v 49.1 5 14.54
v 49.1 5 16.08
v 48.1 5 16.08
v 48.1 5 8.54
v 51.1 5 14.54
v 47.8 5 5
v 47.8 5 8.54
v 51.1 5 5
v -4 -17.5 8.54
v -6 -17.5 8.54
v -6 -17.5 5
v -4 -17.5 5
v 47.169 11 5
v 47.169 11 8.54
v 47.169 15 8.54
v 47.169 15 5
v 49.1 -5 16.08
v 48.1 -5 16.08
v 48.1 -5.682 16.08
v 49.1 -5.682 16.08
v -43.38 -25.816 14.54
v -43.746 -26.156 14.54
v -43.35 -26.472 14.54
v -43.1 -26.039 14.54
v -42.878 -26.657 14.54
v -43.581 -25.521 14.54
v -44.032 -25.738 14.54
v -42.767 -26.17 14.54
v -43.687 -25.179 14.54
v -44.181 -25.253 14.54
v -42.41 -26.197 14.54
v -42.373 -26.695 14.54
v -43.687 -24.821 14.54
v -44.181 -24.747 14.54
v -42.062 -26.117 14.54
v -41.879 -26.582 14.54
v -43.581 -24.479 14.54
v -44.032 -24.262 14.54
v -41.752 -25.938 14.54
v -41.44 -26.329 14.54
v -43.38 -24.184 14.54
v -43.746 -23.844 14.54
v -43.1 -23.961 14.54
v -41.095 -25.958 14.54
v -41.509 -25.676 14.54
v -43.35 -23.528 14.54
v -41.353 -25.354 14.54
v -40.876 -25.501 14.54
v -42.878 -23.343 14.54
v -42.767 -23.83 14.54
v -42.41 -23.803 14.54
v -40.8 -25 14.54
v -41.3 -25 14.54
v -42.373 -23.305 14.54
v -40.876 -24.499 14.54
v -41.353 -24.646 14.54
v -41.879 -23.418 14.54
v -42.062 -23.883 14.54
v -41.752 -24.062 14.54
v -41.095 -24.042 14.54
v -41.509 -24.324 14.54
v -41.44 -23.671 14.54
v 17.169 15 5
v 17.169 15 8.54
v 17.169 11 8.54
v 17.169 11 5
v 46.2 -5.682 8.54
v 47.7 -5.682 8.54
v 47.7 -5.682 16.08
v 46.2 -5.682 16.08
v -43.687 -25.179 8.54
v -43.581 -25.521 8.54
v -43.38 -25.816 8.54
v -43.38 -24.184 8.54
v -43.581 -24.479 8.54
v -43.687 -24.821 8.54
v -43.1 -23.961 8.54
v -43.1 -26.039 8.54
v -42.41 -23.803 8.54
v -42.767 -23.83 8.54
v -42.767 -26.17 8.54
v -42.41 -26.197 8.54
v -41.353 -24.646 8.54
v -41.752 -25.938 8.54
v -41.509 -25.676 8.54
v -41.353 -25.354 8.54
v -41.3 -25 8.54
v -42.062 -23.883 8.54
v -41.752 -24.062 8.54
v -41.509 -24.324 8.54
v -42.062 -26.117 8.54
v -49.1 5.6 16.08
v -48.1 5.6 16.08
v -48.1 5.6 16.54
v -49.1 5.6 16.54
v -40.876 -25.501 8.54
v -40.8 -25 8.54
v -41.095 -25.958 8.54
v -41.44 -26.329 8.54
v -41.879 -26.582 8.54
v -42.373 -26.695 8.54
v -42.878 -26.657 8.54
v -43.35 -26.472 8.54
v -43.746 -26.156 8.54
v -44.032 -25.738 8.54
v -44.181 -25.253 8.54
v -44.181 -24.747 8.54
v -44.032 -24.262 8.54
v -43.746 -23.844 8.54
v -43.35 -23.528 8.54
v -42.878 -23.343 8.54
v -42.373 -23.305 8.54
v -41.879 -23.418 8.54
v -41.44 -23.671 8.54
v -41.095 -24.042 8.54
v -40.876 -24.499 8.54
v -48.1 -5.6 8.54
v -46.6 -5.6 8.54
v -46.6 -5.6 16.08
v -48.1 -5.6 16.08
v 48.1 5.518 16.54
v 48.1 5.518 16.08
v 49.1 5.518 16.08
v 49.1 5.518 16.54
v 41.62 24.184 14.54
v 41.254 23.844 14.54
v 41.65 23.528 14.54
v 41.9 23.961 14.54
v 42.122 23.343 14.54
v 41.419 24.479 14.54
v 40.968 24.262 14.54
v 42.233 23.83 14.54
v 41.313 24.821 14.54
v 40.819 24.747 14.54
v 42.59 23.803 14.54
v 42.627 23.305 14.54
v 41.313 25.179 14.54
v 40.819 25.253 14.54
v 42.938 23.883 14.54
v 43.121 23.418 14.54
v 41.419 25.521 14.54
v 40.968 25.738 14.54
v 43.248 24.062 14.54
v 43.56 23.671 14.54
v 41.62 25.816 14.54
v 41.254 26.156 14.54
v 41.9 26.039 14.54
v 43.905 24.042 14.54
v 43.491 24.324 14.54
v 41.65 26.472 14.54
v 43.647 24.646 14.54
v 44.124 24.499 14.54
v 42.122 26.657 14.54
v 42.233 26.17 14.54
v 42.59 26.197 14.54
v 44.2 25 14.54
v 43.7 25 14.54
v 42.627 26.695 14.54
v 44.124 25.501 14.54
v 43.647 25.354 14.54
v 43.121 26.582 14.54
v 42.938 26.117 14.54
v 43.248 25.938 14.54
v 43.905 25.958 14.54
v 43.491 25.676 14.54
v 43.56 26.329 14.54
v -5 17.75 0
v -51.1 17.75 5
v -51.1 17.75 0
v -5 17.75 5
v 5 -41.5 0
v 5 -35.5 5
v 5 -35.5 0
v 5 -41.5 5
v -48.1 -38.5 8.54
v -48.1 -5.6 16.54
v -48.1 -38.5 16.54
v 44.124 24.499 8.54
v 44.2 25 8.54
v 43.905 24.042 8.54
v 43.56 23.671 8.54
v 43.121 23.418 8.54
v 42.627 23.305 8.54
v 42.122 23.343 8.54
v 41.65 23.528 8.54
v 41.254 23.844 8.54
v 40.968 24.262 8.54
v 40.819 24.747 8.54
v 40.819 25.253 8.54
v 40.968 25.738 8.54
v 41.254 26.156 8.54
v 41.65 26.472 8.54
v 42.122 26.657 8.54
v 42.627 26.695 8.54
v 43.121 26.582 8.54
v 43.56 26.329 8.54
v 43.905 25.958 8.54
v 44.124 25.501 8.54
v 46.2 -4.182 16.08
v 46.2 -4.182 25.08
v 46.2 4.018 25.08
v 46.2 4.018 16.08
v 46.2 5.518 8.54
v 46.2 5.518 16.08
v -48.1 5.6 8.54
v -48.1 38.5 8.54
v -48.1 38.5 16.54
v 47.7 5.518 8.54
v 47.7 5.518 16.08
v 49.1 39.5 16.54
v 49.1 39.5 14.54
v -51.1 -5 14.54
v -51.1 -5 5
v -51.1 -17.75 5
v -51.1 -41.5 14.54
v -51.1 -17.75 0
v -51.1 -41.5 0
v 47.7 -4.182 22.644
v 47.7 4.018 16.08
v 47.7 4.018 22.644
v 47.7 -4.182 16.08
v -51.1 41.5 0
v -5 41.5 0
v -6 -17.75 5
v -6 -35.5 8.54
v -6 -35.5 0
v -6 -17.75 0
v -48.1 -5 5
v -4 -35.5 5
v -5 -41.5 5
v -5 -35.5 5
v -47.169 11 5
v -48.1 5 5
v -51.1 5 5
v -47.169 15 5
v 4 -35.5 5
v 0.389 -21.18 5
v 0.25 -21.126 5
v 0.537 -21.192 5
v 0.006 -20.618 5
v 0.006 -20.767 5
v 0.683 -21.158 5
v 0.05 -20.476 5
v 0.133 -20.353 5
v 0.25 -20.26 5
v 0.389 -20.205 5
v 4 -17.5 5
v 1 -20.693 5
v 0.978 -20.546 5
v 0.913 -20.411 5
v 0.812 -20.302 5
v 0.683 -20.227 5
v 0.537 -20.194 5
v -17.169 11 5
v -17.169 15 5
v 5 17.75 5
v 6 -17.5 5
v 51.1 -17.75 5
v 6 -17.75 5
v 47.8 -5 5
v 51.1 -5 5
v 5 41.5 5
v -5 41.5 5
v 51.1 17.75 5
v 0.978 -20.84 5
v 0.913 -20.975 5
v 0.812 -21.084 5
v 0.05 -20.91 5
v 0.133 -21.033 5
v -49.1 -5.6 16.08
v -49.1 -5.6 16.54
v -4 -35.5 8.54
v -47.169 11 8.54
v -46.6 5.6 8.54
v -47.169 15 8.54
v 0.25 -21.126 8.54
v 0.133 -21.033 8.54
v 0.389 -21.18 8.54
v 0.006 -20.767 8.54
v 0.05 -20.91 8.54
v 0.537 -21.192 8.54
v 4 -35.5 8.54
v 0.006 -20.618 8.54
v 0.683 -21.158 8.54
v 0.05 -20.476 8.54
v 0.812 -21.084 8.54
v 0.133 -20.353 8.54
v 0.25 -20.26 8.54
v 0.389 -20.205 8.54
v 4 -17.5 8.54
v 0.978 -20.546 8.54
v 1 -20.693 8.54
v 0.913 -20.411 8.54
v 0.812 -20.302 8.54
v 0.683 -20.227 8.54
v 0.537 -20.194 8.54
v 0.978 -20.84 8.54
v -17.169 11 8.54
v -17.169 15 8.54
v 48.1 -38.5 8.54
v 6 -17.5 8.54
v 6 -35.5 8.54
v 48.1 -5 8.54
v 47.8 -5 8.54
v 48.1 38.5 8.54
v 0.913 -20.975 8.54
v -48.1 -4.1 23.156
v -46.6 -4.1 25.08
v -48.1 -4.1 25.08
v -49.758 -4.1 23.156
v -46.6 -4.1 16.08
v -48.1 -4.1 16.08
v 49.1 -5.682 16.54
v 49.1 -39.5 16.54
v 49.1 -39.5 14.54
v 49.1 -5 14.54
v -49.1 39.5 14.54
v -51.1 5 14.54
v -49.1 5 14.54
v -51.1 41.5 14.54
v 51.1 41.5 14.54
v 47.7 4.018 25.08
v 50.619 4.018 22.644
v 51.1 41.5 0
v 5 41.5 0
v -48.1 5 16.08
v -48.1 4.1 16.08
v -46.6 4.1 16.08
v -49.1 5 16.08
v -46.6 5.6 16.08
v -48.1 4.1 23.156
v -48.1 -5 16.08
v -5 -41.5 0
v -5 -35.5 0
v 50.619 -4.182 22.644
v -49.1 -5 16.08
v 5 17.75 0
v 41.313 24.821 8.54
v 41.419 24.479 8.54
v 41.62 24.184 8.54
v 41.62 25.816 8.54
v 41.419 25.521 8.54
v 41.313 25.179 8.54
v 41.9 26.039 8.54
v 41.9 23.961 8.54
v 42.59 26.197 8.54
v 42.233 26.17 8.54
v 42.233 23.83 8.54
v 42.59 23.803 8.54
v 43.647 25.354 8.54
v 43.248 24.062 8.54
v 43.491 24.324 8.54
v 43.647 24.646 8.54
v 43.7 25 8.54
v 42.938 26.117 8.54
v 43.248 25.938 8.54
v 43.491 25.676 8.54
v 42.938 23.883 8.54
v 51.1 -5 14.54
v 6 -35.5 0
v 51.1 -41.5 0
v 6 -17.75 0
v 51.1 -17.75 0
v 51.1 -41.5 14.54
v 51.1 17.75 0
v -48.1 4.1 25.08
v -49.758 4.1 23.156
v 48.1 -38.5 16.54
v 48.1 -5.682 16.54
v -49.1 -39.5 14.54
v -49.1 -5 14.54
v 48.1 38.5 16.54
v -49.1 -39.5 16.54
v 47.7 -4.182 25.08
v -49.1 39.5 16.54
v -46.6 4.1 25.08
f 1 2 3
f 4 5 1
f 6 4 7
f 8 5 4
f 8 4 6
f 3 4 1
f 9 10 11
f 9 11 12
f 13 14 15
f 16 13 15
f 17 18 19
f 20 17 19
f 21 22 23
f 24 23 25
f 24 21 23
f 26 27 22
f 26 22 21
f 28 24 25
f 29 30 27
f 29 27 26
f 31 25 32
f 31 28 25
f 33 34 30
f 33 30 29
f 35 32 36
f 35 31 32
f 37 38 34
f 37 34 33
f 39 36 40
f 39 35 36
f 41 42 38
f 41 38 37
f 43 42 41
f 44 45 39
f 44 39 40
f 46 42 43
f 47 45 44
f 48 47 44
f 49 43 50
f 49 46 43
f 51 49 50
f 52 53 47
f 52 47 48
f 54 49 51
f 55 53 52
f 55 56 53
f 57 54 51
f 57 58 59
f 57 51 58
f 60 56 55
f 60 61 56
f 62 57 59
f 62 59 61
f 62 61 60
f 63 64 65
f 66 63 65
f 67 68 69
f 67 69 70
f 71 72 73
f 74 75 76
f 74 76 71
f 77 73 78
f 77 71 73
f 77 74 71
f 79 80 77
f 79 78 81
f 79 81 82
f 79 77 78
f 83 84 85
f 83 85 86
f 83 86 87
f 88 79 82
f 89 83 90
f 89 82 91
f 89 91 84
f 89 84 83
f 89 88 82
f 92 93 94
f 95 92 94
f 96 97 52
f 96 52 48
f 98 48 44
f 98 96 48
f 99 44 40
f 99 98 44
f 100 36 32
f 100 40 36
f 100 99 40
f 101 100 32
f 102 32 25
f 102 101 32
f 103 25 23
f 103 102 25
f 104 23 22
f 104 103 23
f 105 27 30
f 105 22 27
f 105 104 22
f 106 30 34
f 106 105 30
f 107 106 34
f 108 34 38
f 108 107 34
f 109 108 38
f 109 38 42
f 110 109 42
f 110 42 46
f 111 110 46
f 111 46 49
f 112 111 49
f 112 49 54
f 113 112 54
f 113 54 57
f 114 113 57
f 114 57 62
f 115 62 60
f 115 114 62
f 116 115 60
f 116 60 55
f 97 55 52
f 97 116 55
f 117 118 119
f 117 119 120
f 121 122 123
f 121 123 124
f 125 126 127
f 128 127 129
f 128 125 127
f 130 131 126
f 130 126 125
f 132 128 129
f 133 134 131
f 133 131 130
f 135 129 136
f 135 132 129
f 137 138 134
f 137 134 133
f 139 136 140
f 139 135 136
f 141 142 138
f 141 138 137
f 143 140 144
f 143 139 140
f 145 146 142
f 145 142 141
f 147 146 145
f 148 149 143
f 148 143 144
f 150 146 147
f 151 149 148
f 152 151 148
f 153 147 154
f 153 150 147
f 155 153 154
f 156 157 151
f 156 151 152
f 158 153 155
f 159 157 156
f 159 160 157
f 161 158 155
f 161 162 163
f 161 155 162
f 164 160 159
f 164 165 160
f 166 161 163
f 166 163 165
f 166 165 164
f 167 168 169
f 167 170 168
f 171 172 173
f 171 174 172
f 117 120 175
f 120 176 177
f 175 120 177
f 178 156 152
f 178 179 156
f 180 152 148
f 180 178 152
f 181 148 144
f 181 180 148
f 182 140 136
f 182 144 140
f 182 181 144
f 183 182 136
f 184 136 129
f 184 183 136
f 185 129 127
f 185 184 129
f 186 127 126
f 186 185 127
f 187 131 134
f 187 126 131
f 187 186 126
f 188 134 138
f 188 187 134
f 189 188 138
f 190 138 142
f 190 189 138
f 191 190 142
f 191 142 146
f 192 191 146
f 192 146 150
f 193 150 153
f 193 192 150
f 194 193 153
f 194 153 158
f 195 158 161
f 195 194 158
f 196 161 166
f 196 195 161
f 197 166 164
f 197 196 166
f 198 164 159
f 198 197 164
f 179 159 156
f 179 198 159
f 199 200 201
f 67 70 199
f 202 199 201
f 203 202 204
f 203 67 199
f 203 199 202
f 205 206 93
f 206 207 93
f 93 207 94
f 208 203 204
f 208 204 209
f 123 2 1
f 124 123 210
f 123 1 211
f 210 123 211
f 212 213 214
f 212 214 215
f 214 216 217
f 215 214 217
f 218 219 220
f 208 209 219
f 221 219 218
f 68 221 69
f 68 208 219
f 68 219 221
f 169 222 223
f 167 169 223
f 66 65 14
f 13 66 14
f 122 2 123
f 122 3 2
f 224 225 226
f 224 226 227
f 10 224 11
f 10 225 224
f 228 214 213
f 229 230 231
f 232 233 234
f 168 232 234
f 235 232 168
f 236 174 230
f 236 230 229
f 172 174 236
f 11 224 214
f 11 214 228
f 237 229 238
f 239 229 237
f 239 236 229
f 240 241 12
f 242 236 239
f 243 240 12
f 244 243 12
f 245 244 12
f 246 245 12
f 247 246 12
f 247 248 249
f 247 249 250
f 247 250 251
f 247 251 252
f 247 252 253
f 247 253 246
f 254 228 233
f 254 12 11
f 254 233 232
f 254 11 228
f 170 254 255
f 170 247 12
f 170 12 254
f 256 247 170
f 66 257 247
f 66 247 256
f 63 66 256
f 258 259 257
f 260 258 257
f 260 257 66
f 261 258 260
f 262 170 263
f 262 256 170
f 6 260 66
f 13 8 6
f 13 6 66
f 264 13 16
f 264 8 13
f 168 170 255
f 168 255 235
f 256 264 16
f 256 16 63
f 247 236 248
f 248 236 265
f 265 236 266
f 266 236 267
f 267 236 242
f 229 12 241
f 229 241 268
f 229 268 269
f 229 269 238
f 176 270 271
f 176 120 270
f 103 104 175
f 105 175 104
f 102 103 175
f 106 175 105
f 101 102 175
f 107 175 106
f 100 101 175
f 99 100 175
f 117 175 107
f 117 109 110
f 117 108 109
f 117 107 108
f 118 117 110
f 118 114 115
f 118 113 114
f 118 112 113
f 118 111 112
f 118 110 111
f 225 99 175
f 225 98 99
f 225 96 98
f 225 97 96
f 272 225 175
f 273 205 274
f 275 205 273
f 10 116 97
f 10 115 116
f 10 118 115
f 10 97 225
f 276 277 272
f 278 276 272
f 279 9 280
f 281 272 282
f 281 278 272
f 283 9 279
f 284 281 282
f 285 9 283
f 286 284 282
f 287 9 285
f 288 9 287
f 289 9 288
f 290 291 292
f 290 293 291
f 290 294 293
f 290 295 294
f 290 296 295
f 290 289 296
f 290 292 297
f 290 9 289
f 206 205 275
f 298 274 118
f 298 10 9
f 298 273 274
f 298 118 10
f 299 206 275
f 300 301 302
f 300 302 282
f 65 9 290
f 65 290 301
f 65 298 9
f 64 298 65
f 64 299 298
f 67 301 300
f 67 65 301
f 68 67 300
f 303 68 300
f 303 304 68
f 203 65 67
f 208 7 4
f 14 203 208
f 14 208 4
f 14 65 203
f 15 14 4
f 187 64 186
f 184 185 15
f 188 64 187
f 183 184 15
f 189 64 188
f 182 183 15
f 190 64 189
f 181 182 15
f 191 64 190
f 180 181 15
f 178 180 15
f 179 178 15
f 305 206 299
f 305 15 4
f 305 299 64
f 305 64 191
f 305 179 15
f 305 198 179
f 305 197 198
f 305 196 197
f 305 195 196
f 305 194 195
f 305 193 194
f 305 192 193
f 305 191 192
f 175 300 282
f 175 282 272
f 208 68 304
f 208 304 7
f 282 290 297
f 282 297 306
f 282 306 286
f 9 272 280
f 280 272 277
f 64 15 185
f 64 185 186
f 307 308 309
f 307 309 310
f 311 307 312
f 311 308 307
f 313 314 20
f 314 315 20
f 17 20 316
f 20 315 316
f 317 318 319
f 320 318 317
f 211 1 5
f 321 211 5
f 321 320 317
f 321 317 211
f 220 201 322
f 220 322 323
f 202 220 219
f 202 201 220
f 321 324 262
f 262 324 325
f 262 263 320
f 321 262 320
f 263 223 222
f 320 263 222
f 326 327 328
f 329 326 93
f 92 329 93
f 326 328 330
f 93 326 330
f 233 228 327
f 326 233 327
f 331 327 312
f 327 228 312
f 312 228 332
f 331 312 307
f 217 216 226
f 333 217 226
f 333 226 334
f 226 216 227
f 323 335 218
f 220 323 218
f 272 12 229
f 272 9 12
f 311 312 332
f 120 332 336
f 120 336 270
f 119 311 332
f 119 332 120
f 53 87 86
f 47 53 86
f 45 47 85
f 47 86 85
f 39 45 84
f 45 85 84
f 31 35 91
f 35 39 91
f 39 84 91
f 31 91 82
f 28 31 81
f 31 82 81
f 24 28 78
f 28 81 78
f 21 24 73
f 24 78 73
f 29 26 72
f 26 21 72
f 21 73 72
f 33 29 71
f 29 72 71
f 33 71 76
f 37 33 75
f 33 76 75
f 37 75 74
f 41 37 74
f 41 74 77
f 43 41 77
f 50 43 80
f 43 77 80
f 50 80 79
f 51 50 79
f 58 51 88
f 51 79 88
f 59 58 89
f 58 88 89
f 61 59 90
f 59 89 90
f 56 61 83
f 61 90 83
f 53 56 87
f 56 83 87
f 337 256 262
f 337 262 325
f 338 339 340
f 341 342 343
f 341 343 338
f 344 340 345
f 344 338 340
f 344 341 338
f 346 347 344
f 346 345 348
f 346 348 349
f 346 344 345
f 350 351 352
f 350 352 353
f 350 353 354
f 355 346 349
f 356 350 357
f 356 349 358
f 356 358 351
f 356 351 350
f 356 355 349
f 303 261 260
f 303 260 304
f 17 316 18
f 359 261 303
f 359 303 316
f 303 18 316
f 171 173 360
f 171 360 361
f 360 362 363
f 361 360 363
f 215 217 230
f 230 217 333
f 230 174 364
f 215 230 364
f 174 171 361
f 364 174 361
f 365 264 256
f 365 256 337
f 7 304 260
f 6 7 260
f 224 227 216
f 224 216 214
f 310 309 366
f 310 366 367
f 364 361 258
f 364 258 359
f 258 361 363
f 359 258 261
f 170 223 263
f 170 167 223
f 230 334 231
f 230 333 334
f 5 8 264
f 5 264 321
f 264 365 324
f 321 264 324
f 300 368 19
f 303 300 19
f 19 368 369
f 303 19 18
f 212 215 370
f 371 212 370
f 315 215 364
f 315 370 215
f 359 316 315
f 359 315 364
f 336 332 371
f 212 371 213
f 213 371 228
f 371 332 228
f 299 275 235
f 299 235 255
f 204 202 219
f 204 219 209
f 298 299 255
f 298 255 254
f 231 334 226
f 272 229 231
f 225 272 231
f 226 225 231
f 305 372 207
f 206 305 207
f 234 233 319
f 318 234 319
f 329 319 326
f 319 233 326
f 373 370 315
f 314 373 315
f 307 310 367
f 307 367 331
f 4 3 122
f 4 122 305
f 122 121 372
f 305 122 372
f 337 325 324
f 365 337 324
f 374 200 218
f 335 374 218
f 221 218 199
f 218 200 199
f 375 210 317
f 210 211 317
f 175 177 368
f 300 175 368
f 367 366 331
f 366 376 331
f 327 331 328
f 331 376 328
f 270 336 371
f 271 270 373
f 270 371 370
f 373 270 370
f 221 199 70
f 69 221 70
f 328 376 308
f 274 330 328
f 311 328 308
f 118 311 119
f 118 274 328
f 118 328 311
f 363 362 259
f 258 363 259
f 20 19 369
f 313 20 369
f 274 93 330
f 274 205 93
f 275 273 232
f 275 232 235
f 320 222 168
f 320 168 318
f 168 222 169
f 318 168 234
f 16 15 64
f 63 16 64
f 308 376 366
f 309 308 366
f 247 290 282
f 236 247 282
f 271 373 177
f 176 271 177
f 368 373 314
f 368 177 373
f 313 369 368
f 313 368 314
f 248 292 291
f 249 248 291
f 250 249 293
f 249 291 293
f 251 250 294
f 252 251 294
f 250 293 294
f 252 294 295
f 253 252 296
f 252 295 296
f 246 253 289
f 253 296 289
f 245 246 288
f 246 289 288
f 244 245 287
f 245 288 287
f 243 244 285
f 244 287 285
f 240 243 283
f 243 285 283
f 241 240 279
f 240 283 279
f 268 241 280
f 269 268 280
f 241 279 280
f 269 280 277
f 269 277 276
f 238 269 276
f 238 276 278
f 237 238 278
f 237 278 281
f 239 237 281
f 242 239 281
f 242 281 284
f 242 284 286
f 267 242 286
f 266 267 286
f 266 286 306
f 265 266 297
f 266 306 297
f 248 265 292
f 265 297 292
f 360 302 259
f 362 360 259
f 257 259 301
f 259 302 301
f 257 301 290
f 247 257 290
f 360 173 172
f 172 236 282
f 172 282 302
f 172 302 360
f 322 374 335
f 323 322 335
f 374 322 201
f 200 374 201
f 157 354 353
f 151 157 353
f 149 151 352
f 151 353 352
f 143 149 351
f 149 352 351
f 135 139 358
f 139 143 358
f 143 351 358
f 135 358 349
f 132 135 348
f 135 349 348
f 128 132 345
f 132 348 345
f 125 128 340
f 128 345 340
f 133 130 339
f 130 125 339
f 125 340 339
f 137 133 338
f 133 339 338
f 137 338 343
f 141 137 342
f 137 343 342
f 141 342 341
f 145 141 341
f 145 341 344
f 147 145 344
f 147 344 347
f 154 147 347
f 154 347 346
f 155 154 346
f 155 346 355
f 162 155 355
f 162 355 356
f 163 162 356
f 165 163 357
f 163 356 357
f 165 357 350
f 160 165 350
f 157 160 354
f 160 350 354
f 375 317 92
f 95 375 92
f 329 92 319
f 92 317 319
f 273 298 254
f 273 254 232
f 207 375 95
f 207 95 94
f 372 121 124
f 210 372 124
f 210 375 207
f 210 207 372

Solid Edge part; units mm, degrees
sketch "Sketch1" plane through (0, 0, 0) normal (0, 0, 1) x (1, 0, 0)
  line L0 (51.1, -41.5) -> (51.1, 41.5)
  line L1 (51.1, 41.5) -> (-51.1, 41.5)
  line L2 (-51.1, 41.5) -> (-51.1, -41.5)
  line L3 (-51.1, -41.5) -> (51.1, -41.5)
extrude "Protrusion1" add sketch "Sketch1" along normal blind 14.54
sketch "Sketch2" plane through (0, 0, 14.54) normal (0, 0, 1) x (1, 0, 0)
  line L0 (49.1, -39.5) -> (49.1, 39.5)
  line L1 (49.1, 39.5) -> (-49.1, 39.5)
  line L2 (-49.1, 39.5) -> (-49.1, -39.5)
  line L3 (-49.1, -39.5) -> (49.1, -39.5)
extrude "ProtrusiónExtruida_2" add sketch "Sketch2" along normal blind 2
sketch "Sketch3" plane through (0, 0, 16.54) normal (0, 0, 1) x (1, 0, 0)
  line L0 (48.1, -38.5) -> (48.1, 38.5)
  line L1 (48.1, 38.5) -> (-48.1, 38.5)
  line L2 (-48.1, 38.5) -> (-48.1, -38.5)
  line L3 (-48.1, -38.5) -> (48.1, -38.5)
extrude "VaciadoExtruido_1" cut sketch "Sketch3" against normal blind 8
sketch "Sketch4" plane through (0, 0, 8.54) normal (0, 0, 1) x (1, 0, 0)
  circle A0 centre (42.5, 25) radius 1.7
  circle A1 centre (42.5, 25) radius 1.2
  circle A2 centre (-42.5, -25) radius 1.7
  circle A3 centre (-42.5, -25) radius 1.2
  dimension "D1" = 2.4
  dimension "D2" = 2.4
  dimension "D3" = 3.4
  dimension "D4" = 3.4
extrude "ProtrusiónExtruida_5" add sketch "Sketch4" along normal blind 6
sketch "Sketch5" plane through (0, 0, 8.54) normal (0, 0, 1) x (1, 0, 0)
  line L0 (-6, -35.5) -> (-6, -17.5)
  line L1 (-6, -17.5) -> (-4, -17.5)
  line L2 (-4, -17.5) -> (-4, -35.5)
  line L3 (-4, -35.5) -> (-6, -35.5)
  line L4 (6, -35.5) -> (6, -17.5)
  line L5 (6, -17.5) -> (4, -17.5)
  line L6 (4, -17.5) -> (4, -35.5)
  line L7 (4, -35.5) -> (6, -35.5)
  dimension "D1" = 2
  dimension "D2" = 3
  dimension "D3" = 18
extrude "VaciadoExtruido_3" cut sketch "Sketch5" against normal blind 60
sketch "Sketch6" plane through (0, 0, 8.54) normal (0, 0, 1) x (1, 0, 0)
  circle A0 centre (0.5, -20.6929) radius 0.5
extrude "VaciadoExtruido_4" cut sketch "Sketch6" against normal blind 60
sketch "Sketch7" plane through (0, 0, 8.54) normal (0, 0, 1) x (1, 0, 0)
  line L0 (47.1689, 15) -> (17.1689, 15)
  line L1 (17.1689, 15) -> (17.1689, 11)
  line L2 (17.1689, 11) -> (47.1689, 11)
  line L3 (47.1689, 11) -> (47.1689, 15)
  line L4 (-47.1689, 15) -> (-17.1689, 15)
  line L5 (-17.1689, 15) -> (-17.1689, 11)
  line L6 (-17.1689, 11) -> (-47.1689, 11)
  line L7 (-47.1689, 11) -> (-47.1689, 15)
  dimension "D1" = 4
  dimension "D2" = 30
extrude "VaciadoExtruido_5" cut sketch "Sketch7" against normal blind 61.0922
sketch "Sketch8" plane through (51.1, 0, 7.27) normal (1, 0, 0) x (0, 1, 0)
  line L0 (5, 9.27) -> (5, -7.27)
  line L1 (5, -7.27) -> (-5, -7.27)
  line L2 (-5, -7.27) -> (-5, 9.27)
  line L3 (-5, 9.27) -> (5, 9.27)
extrude "VaciadoExtruido_7" cut sketch "Sketch8" against normal blind 3.3
sketch "Sketch9" plane through (0, 0, 8.54) normal (0, 0, 1) x (1, 0, 0)
  line L0 (47.7, 5.5178) -> (47.7, -5.6822)
  line L1 (47.7, -5.6822) -> (46.2, -5.6822)
  line L2 (46.2, -5.6822) -> (46.2, 5.5178)
  line L3 (46.2, 5.5178) -> (47.7, 5.5178)
extrude "ProtrusiónExtruida_6" add sketch "Sketch9" along normal blind 16.54
sketch "Sketch10" plane through (46.95, -5.6822, 16.81) normal (0, -1, 0) x (0, 0, -1)
  line L0 (-8.27, 0.75) -> (-5.8337, 3.6691)
  line L1 (-5.8337, 3.6691) -> (-5.8337, 0.75)
  line L2 (-5.8337, 0.75) -> (-8.27, 0.75)
extrude "ProtrusiónExtruida_8" add sketch "Sketch10" against normal blind 11.2
sketch "Sketch11" plane through (46.2, -0.0822, 16.81) normal (-1, 0, 0) x (0, -1, 0)
  line L0 (5.6, -0.73) -> (5.6, 8.27)
  line L1 (5.6, 8.27) -> (4.1, 8.27)
  line L2 (4.1, 8.27) -> (4.1, -0.73)
  line L3 (4.1, -0.73) -> (5.6, -0.73)
  line L4 (-4.1, 8.27) -> (-4.1, -0.73)
  line L5 (-4.1, -0.73) -> (-5.6, -0.73)
  line L6 (-5.6, -0.73) -> (-5.6, 8.27)
  line L7 (-5.6, 8.27) -> (-4.1, 8.27)
extrude "Cutout1" cut sketch "Sketch11" against normal blind 34.3591
sketch "Sketch12" plane through (0, -41.5, 7.27) normal (0, -1, 0) x (1, 0, 0)
  line L0 (-5, -7.27) -> (-5, -2.27)
  line L1 (-5, -2.27) -> (5, -2.27)
  line L2 (5, -2.27) -> (5, -7.27)
  line L3 (5, -7.27) -> (-5, -7.27)
extrude "VaciadoExtruido_18" cut sketch "Sketch12" against normal blind 10000
sketch "Sketch13" plane through (51.1, 23.25, 7.27) normal (1, 0, 0) x (0, 1, 0)
  line L0 (-5.5, -2.27) -> (-5.5, -7.27)
  line L1 (-5.5, -7.27) -> (-41, -7.27)
  line L2 (-41, -7.27) -> (-41, -2.27)
  line L3 (-41, -2.27) -> (-5.5, -2.27)
extrude "Cutout2" cut sketch "Sketch13" against normal blind 100000
sketch "Sketch14" plane through (-48.1, 0, 12.54) normal (1, 0, 0) x (0, 1, 0)
  line L0 (5, -12.54) -> (5, 4)
  line L1 (5, 4) -> (-5, 4)
  line L2 (-5, 4) -> (-5, -12.54)
  line L3 (-5, -12.54) -> (5, -12.54)
extrude "Cutout3" cut sketch "Sketch14" against normal blind 3.3
sketch "Sketch15" plane through (0, 0, 8.54) normal (0, 0, 1) x (0, 1, 0)
  line L0 (5.6, 46.6) -> (-5.6, 46.6)
  line L1 (-5.6, 46.6) -> (-5.6, 48.1)
  line L2 (-5.6, 48.1) -> (5.6, 48.1)
  line L3 (5.6, 48.1) -> (5.6, 46.6)
extrude "ProtrusiónExtruida_9" add sketch "Sketch15" along normal blind 16.54
sketch "Sketch16" plane through (-47.35, -5.6, 16.81) normal (0, -1, 0) x (0, 0, 1)
  line L0 (8.27, 0.75) -> (6.3463, 2.4083)
  line L1 (6.3463, 2.4083) -> (6.3463, 0.75)
  line L2 (6.3463, 0.75) -> (8.27, 0.75)
extrude "Protrusion2" add sketch "Sketch16" against normal up to vertex (11.2 mm away)
sketch "Sketch17" plane through (-46.6, 0, 16.81) normal (1, 0, 0) x (0, 1, 0)
  line L0 (-4.1, 8.27) -> (-4.1, -0.73)
  line L1 (-4.1, -0.73) -> (-5.6, -0.73)
  line L2 (-5.6, -0.73) -> (-5.6, 8.27)
  line L3 (-5.6, 8.27) -> (-4.1, 8.27)
  line L4 (4.1, 8.27) -> (4.1, -0.73)
  line L5 (4.1, -0.73) -> (5.6, -0.73)
  line L6 (5.6, -0.73) -> (5.6, 8.27)
  line L7 (5.6, 8.27) -> (4.1, 8.27)
extrude "Cutout4" cut sketch "Sketch17" against normal blind 20988
